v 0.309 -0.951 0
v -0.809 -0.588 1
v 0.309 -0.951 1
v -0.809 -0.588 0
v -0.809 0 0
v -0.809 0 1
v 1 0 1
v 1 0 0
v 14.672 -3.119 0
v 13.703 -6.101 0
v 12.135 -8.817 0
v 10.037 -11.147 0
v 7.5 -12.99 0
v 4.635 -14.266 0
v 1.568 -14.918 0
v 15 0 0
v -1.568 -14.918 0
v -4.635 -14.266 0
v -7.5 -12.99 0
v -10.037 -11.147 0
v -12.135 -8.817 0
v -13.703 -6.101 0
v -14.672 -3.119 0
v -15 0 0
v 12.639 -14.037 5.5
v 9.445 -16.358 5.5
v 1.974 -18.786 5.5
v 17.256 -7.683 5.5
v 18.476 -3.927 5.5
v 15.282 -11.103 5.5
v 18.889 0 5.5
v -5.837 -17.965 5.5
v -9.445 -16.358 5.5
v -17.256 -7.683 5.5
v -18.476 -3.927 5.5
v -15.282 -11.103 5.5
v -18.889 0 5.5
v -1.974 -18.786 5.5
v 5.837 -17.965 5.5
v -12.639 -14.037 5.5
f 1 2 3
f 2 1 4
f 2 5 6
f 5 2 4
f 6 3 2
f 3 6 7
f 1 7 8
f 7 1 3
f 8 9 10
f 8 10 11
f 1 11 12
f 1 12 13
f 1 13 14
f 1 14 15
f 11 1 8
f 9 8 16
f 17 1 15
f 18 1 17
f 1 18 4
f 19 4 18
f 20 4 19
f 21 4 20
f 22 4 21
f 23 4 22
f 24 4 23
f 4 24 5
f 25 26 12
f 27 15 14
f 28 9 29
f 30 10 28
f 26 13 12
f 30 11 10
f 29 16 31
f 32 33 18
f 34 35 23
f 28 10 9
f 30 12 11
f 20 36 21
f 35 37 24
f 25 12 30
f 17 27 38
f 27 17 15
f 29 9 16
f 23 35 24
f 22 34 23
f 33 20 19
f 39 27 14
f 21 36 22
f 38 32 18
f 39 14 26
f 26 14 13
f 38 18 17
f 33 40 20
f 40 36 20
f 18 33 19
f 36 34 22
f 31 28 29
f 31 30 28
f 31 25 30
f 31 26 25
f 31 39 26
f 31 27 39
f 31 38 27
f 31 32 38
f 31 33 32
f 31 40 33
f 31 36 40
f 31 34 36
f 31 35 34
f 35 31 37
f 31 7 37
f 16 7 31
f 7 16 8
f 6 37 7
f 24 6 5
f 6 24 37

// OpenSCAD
clearance = 0.254;

extruder_diameter = 0.8;

bracket_thickness = 10;
gate_head_slot_thickness = 2;
gate_head_thickness = 3.5;
gate_head_diameter = 20.2;
gate_socket_outer_slope_degrees = 45;
gate_socket_outer_diameter_gate_side = 30;

module gate_socket() {
gate_socket_outer_height = gate_head_slot_thickness + gate_head_thickness;
gate_socket_outer_diameter_mounting_side = gate_socket_outer_diameter_gate_side + (2 * gate_socket_outer_height * cos(gate_socket_outer_slope_degrees));

    module outer_shell() {
        boss_outer_diameter_gate_side = 30;
        cylinder(
            h=gate_socket_outer_height,
            r1=gate_socket_outer_diameter_gate_side / 2,
            r2=gate_socket_outer_diameter_mounting_side / 2
        );
    }

    module top_cut() {
        translate([-gate_socket_outer_diameter_mounting_side / 2, 0 ,0])
        cube(gate_socket_outer_diameter_mounting_side);
    }

    module inner_cut() {
        module gate_head_slot_cut() {
            // the smallest cylindrical cut near outermost surface
        };
        cylinder(h=1, r=1);
        cylinder(h=1, r=1);
    }

    difference() {
        outer_shell();
        top_cut();
        inner_cut();
    };
}

gate_socket();
